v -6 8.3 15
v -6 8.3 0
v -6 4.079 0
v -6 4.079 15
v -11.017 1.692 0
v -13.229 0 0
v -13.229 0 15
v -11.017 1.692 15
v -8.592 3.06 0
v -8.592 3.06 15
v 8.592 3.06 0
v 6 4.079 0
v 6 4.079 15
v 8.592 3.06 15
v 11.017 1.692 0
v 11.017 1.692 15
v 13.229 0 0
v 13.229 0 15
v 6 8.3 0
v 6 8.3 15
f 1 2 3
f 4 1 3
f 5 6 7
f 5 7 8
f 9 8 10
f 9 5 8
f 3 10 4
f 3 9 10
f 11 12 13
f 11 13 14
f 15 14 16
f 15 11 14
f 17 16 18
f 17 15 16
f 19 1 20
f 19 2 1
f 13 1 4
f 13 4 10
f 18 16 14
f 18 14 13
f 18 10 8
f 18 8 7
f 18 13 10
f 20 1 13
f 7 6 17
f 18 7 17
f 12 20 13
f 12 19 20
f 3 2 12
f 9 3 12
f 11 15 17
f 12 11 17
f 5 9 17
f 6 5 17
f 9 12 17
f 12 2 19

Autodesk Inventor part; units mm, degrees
ref_plane "YZ Plane" through (0, 0, 0) normal (1, 0, 0) x (0, 1, 0)
ref_plane "XZ Plane" through (0, 0, 0) normal (0, 1, 0) x (-1, 0, 0)
ref_plane "XY Plane" through (0, 0, 0) normal (0, 0, 1) x (1, 0, 0)
sketch "Skizze1" plane through (0, 0, 0) normal (0, 0, 1) x (1, 0, 0)
  line L0 (-6, 8.3) -> (6, 8.3)
  line L1 (0, 0) -> (0, 8.3) construction
  line L2 (-6, 8.3) -> (-6, 4.0788)
  circle A0 centre (0, -15) radius 20 construction
  line L3 (6, 8.3) -> (6, 4.0788)
  line L4 (-6, 4.0788) -> (6, 4.0788) construction
  line L5 (-13.2288, 0) -> (13.2288, 0)
  arc A1 (-6, 4.0788) -> (-13.2288, 0) centre (0, -15) ccw
  arc A2 (13.2288, 0) -> (6, 4.0788) centre (0, -15) ccw
  point P0 (0, 5)
  dimension "d0" = 40
  dimension "d1" = 12
  dimension "d2" = 3.3
  dimension "d3" = 5
extrude "Extrusion1" add sketch "Skizze1" along normal blind 15
equation "\"d0\" = D"
equation "\"d1\" = Passfeder_Width_40"
equation "\"d2\" = Nabennuttiefe_40"
equation "\"d3\" = Wellennuttiefe_40"
equation "\"D\" = 40"
equation "\"Passfeder_Width_40\" = 12"
equation "\"Nabennuttiefe_40\" = 3.3"
equation "\"Wellennuttiefe_40\" = 5"
properties part number "Capston_Disc_Flachstelle"
